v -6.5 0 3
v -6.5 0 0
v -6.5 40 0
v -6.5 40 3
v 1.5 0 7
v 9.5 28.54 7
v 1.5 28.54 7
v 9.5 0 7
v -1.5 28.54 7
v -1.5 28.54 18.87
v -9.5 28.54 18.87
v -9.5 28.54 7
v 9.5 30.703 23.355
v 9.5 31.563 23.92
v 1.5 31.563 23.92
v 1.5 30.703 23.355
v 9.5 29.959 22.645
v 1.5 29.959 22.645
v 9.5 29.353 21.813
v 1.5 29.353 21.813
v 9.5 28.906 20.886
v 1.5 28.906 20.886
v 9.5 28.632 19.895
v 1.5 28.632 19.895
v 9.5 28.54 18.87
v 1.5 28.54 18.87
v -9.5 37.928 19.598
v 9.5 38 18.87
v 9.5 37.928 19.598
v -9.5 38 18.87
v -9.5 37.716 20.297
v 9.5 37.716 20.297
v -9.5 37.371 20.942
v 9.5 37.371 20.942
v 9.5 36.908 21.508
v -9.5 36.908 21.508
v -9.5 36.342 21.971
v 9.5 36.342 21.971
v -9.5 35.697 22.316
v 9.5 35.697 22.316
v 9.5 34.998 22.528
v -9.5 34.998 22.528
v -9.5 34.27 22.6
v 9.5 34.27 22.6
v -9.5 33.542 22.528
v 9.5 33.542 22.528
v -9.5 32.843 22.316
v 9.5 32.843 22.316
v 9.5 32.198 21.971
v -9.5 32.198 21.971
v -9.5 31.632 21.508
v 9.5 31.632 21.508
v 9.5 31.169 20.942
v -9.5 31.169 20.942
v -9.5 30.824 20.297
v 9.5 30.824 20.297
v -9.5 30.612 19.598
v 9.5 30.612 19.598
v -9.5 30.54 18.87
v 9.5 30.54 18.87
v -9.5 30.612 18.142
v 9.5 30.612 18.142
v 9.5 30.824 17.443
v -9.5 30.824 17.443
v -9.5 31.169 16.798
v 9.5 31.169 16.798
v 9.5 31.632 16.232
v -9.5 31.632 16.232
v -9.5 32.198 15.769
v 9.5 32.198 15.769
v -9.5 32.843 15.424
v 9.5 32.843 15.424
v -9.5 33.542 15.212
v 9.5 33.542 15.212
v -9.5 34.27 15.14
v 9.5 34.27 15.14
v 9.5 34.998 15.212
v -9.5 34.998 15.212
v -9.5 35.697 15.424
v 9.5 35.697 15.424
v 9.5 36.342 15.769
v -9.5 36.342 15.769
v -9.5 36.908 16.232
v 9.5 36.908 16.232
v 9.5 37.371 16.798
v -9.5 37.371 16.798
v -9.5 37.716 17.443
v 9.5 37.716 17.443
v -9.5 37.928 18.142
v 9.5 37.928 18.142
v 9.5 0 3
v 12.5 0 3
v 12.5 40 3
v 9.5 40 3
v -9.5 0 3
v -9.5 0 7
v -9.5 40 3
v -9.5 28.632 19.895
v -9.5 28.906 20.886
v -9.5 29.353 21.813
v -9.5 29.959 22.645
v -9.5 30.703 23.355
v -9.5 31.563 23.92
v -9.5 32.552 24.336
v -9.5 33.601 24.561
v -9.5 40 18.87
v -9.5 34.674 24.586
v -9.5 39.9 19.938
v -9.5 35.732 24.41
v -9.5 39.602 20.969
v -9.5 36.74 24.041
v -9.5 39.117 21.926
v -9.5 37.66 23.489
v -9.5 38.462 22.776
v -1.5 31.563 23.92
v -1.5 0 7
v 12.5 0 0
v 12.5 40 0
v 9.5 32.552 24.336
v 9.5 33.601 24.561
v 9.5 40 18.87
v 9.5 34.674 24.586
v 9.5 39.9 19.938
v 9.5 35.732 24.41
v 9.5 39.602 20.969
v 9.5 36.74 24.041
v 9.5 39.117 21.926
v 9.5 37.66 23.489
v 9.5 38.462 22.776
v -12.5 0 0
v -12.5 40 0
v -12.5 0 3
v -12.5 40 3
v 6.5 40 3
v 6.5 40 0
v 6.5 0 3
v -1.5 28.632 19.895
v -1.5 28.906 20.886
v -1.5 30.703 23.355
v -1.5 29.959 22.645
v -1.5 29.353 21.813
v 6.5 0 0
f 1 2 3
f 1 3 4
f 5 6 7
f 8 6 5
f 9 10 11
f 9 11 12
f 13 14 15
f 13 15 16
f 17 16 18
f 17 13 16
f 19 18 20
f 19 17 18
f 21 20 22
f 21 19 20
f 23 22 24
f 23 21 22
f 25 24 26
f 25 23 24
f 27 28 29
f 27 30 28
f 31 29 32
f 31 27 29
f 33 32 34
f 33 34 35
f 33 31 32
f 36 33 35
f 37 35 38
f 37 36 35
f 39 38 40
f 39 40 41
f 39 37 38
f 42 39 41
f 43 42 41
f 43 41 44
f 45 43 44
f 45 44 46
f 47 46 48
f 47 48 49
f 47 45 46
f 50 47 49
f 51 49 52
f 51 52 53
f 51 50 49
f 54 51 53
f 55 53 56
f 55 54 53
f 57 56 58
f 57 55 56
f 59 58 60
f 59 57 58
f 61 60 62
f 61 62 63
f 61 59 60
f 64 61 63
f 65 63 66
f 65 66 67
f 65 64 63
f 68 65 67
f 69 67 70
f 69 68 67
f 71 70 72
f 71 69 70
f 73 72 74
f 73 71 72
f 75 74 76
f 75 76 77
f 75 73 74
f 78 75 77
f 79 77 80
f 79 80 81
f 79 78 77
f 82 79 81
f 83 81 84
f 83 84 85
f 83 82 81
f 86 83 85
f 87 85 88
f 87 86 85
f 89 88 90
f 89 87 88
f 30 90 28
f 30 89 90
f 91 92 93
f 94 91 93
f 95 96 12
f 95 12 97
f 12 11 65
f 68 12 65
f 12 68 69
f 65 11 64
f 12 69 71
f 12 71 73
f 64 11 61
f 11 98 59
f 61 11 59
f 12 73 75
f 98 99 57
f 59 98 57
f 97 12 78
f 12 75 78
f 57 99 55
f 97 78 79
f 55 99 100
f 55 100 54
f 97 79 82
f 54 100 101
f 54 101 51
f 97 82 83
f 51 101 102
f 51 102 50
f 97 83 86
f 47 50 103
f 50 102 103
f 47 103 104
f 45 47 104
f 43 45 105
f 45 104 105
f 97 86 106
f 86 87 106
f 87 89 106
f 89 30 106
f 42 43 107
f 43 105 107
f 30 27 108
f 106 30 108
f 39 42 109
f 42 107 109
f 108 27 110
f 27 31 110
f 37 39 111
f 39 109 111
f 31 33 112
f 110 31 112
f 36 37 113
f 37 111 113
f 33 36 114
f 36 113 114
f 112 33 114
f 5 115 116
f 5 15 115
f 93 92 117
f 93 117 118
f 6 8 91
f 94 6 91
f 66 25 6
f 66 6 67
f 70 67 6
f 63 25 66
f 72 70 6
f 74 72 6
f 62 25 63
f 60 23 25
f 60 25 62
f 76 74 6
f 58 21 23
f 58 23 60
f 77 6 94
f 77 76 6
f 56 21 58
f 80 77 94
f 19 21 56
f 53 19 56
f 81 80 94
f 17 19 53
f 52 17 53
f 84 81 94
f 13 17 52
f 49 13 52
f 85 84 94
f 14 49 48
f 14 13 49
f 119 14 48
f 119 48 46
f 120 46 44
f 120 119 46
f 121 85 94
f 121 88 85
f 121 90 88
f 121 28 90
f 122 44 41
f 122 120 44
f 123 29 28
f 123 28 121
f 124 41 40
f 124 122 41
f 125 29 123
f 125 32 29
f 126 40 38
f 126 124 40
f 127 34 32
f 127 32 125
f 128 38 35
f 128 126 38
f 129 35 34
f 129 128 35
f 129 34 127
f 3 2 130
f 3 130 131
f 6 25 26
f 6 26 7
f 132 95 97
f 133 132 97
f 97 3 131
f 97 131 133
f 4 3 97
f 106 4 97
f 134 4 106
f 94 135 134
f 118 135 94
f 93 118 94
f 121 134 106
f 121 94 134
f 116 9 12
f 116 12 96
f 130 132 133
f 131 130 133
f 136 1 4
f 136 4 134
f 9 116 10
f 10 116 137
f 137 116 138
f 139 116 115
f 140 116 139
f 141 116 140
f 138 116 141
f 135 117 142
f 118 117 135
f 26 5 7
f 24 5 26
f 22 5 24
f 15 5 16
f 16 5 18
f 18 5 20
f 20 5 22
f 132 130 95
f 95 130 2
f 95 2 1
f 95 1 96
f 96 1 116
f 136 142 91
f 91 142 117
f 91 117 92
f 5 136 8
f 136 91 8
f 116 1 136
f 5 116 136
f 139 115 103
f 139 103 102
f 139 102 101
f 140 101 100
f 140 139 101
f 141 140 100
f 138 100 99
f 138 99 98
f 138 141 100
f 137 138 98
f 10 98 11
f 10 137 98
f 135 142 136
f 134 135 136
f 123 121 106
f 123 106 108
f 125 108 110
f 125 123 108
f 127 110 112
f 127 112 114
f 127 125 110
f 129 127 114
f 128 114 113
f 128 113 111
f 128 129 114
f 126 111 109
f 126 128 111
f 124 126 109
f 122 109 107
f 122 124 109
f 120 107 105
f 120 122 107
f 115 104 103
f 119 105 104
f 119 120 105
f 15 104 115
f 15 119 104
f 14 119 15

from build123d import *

# Parameters (mm, degrees)
F0_W     = 40
F0_H     = 3
F1_DEPTH = 12.5
F2_DEPTH = 9.5
F0_R     = 3.73
F3_DEPTH = 9.5
F4_DEPTH = 1.5
F5_W     = 13
F5_H     = 3
F6_DEPTH = 40


with BuildPart() as f1:
    # F0 (on Right) → F1 (new body, symmetric)
    with BuildSketch(Plane.YZ):
        with Locations((20, 1.5)):
            Rectangle(F0_W, F0_H)
    extrude(amount=F1_DEPTH, both=True)

    # F0 (on Right) → F2 (join, symmetric)
    with BuildSketch(Plane.YZ):
        Polygon((0, 7), (0, 3), (40, 3), (40, 7), (28.54, 7), align=None)
    extrude(amount=F2_DEPTH, both=True)

    # F0 (on Right) → F3 (join, symmetric)
    with BuildSketch(Plane.YZ):
        with BuildLine():
            Line((28.54, 7), (40, 7))
            Line((40, 7), (40, 18.87))
            ThreePointArc((40, 18.87), (37.212814, 23.786579), (31.562741, 23.920114))
            ThreePointArc((31.562741, 23.920114), (29.353421, 21.812814), (28.54, 18.87))
            Line((28.54, 18.87), (28.54, 7))
        make_face()
        with Locations((34.27, 18.87)):
            Circle(F0_R, mode=Mode.SUBTRACT)
    extrude(amount=F3_DEPTH, both=True)

    # F0 (on Right) → F4 (join, symmetric)
    with BuildSketch(Plane.YZ):
        with BuildLine():
            Line((31.562741, 23.920114), (0, 7))
            Line((0, 7), (28.54, 7))
            Line((28.54, 7), (28.54, 18.87))
            ThreePointArc((28.54, 18.87), (29.353421, 21.812814), (31.562741, 23.920114))
        make_face()
    extrude(amount=F4_DEPTH, both=True)

    # F5 (on face) → F6 (cut, through all)
    with BuildSketch(Plane.XZ):
        with Locations((0, 1.5)):
            Rectangle(F5_W, F5_H)
    extrude(amount=-F6_DEPTH, mode=Mode.SUBTRACT)


solid = f1.part
